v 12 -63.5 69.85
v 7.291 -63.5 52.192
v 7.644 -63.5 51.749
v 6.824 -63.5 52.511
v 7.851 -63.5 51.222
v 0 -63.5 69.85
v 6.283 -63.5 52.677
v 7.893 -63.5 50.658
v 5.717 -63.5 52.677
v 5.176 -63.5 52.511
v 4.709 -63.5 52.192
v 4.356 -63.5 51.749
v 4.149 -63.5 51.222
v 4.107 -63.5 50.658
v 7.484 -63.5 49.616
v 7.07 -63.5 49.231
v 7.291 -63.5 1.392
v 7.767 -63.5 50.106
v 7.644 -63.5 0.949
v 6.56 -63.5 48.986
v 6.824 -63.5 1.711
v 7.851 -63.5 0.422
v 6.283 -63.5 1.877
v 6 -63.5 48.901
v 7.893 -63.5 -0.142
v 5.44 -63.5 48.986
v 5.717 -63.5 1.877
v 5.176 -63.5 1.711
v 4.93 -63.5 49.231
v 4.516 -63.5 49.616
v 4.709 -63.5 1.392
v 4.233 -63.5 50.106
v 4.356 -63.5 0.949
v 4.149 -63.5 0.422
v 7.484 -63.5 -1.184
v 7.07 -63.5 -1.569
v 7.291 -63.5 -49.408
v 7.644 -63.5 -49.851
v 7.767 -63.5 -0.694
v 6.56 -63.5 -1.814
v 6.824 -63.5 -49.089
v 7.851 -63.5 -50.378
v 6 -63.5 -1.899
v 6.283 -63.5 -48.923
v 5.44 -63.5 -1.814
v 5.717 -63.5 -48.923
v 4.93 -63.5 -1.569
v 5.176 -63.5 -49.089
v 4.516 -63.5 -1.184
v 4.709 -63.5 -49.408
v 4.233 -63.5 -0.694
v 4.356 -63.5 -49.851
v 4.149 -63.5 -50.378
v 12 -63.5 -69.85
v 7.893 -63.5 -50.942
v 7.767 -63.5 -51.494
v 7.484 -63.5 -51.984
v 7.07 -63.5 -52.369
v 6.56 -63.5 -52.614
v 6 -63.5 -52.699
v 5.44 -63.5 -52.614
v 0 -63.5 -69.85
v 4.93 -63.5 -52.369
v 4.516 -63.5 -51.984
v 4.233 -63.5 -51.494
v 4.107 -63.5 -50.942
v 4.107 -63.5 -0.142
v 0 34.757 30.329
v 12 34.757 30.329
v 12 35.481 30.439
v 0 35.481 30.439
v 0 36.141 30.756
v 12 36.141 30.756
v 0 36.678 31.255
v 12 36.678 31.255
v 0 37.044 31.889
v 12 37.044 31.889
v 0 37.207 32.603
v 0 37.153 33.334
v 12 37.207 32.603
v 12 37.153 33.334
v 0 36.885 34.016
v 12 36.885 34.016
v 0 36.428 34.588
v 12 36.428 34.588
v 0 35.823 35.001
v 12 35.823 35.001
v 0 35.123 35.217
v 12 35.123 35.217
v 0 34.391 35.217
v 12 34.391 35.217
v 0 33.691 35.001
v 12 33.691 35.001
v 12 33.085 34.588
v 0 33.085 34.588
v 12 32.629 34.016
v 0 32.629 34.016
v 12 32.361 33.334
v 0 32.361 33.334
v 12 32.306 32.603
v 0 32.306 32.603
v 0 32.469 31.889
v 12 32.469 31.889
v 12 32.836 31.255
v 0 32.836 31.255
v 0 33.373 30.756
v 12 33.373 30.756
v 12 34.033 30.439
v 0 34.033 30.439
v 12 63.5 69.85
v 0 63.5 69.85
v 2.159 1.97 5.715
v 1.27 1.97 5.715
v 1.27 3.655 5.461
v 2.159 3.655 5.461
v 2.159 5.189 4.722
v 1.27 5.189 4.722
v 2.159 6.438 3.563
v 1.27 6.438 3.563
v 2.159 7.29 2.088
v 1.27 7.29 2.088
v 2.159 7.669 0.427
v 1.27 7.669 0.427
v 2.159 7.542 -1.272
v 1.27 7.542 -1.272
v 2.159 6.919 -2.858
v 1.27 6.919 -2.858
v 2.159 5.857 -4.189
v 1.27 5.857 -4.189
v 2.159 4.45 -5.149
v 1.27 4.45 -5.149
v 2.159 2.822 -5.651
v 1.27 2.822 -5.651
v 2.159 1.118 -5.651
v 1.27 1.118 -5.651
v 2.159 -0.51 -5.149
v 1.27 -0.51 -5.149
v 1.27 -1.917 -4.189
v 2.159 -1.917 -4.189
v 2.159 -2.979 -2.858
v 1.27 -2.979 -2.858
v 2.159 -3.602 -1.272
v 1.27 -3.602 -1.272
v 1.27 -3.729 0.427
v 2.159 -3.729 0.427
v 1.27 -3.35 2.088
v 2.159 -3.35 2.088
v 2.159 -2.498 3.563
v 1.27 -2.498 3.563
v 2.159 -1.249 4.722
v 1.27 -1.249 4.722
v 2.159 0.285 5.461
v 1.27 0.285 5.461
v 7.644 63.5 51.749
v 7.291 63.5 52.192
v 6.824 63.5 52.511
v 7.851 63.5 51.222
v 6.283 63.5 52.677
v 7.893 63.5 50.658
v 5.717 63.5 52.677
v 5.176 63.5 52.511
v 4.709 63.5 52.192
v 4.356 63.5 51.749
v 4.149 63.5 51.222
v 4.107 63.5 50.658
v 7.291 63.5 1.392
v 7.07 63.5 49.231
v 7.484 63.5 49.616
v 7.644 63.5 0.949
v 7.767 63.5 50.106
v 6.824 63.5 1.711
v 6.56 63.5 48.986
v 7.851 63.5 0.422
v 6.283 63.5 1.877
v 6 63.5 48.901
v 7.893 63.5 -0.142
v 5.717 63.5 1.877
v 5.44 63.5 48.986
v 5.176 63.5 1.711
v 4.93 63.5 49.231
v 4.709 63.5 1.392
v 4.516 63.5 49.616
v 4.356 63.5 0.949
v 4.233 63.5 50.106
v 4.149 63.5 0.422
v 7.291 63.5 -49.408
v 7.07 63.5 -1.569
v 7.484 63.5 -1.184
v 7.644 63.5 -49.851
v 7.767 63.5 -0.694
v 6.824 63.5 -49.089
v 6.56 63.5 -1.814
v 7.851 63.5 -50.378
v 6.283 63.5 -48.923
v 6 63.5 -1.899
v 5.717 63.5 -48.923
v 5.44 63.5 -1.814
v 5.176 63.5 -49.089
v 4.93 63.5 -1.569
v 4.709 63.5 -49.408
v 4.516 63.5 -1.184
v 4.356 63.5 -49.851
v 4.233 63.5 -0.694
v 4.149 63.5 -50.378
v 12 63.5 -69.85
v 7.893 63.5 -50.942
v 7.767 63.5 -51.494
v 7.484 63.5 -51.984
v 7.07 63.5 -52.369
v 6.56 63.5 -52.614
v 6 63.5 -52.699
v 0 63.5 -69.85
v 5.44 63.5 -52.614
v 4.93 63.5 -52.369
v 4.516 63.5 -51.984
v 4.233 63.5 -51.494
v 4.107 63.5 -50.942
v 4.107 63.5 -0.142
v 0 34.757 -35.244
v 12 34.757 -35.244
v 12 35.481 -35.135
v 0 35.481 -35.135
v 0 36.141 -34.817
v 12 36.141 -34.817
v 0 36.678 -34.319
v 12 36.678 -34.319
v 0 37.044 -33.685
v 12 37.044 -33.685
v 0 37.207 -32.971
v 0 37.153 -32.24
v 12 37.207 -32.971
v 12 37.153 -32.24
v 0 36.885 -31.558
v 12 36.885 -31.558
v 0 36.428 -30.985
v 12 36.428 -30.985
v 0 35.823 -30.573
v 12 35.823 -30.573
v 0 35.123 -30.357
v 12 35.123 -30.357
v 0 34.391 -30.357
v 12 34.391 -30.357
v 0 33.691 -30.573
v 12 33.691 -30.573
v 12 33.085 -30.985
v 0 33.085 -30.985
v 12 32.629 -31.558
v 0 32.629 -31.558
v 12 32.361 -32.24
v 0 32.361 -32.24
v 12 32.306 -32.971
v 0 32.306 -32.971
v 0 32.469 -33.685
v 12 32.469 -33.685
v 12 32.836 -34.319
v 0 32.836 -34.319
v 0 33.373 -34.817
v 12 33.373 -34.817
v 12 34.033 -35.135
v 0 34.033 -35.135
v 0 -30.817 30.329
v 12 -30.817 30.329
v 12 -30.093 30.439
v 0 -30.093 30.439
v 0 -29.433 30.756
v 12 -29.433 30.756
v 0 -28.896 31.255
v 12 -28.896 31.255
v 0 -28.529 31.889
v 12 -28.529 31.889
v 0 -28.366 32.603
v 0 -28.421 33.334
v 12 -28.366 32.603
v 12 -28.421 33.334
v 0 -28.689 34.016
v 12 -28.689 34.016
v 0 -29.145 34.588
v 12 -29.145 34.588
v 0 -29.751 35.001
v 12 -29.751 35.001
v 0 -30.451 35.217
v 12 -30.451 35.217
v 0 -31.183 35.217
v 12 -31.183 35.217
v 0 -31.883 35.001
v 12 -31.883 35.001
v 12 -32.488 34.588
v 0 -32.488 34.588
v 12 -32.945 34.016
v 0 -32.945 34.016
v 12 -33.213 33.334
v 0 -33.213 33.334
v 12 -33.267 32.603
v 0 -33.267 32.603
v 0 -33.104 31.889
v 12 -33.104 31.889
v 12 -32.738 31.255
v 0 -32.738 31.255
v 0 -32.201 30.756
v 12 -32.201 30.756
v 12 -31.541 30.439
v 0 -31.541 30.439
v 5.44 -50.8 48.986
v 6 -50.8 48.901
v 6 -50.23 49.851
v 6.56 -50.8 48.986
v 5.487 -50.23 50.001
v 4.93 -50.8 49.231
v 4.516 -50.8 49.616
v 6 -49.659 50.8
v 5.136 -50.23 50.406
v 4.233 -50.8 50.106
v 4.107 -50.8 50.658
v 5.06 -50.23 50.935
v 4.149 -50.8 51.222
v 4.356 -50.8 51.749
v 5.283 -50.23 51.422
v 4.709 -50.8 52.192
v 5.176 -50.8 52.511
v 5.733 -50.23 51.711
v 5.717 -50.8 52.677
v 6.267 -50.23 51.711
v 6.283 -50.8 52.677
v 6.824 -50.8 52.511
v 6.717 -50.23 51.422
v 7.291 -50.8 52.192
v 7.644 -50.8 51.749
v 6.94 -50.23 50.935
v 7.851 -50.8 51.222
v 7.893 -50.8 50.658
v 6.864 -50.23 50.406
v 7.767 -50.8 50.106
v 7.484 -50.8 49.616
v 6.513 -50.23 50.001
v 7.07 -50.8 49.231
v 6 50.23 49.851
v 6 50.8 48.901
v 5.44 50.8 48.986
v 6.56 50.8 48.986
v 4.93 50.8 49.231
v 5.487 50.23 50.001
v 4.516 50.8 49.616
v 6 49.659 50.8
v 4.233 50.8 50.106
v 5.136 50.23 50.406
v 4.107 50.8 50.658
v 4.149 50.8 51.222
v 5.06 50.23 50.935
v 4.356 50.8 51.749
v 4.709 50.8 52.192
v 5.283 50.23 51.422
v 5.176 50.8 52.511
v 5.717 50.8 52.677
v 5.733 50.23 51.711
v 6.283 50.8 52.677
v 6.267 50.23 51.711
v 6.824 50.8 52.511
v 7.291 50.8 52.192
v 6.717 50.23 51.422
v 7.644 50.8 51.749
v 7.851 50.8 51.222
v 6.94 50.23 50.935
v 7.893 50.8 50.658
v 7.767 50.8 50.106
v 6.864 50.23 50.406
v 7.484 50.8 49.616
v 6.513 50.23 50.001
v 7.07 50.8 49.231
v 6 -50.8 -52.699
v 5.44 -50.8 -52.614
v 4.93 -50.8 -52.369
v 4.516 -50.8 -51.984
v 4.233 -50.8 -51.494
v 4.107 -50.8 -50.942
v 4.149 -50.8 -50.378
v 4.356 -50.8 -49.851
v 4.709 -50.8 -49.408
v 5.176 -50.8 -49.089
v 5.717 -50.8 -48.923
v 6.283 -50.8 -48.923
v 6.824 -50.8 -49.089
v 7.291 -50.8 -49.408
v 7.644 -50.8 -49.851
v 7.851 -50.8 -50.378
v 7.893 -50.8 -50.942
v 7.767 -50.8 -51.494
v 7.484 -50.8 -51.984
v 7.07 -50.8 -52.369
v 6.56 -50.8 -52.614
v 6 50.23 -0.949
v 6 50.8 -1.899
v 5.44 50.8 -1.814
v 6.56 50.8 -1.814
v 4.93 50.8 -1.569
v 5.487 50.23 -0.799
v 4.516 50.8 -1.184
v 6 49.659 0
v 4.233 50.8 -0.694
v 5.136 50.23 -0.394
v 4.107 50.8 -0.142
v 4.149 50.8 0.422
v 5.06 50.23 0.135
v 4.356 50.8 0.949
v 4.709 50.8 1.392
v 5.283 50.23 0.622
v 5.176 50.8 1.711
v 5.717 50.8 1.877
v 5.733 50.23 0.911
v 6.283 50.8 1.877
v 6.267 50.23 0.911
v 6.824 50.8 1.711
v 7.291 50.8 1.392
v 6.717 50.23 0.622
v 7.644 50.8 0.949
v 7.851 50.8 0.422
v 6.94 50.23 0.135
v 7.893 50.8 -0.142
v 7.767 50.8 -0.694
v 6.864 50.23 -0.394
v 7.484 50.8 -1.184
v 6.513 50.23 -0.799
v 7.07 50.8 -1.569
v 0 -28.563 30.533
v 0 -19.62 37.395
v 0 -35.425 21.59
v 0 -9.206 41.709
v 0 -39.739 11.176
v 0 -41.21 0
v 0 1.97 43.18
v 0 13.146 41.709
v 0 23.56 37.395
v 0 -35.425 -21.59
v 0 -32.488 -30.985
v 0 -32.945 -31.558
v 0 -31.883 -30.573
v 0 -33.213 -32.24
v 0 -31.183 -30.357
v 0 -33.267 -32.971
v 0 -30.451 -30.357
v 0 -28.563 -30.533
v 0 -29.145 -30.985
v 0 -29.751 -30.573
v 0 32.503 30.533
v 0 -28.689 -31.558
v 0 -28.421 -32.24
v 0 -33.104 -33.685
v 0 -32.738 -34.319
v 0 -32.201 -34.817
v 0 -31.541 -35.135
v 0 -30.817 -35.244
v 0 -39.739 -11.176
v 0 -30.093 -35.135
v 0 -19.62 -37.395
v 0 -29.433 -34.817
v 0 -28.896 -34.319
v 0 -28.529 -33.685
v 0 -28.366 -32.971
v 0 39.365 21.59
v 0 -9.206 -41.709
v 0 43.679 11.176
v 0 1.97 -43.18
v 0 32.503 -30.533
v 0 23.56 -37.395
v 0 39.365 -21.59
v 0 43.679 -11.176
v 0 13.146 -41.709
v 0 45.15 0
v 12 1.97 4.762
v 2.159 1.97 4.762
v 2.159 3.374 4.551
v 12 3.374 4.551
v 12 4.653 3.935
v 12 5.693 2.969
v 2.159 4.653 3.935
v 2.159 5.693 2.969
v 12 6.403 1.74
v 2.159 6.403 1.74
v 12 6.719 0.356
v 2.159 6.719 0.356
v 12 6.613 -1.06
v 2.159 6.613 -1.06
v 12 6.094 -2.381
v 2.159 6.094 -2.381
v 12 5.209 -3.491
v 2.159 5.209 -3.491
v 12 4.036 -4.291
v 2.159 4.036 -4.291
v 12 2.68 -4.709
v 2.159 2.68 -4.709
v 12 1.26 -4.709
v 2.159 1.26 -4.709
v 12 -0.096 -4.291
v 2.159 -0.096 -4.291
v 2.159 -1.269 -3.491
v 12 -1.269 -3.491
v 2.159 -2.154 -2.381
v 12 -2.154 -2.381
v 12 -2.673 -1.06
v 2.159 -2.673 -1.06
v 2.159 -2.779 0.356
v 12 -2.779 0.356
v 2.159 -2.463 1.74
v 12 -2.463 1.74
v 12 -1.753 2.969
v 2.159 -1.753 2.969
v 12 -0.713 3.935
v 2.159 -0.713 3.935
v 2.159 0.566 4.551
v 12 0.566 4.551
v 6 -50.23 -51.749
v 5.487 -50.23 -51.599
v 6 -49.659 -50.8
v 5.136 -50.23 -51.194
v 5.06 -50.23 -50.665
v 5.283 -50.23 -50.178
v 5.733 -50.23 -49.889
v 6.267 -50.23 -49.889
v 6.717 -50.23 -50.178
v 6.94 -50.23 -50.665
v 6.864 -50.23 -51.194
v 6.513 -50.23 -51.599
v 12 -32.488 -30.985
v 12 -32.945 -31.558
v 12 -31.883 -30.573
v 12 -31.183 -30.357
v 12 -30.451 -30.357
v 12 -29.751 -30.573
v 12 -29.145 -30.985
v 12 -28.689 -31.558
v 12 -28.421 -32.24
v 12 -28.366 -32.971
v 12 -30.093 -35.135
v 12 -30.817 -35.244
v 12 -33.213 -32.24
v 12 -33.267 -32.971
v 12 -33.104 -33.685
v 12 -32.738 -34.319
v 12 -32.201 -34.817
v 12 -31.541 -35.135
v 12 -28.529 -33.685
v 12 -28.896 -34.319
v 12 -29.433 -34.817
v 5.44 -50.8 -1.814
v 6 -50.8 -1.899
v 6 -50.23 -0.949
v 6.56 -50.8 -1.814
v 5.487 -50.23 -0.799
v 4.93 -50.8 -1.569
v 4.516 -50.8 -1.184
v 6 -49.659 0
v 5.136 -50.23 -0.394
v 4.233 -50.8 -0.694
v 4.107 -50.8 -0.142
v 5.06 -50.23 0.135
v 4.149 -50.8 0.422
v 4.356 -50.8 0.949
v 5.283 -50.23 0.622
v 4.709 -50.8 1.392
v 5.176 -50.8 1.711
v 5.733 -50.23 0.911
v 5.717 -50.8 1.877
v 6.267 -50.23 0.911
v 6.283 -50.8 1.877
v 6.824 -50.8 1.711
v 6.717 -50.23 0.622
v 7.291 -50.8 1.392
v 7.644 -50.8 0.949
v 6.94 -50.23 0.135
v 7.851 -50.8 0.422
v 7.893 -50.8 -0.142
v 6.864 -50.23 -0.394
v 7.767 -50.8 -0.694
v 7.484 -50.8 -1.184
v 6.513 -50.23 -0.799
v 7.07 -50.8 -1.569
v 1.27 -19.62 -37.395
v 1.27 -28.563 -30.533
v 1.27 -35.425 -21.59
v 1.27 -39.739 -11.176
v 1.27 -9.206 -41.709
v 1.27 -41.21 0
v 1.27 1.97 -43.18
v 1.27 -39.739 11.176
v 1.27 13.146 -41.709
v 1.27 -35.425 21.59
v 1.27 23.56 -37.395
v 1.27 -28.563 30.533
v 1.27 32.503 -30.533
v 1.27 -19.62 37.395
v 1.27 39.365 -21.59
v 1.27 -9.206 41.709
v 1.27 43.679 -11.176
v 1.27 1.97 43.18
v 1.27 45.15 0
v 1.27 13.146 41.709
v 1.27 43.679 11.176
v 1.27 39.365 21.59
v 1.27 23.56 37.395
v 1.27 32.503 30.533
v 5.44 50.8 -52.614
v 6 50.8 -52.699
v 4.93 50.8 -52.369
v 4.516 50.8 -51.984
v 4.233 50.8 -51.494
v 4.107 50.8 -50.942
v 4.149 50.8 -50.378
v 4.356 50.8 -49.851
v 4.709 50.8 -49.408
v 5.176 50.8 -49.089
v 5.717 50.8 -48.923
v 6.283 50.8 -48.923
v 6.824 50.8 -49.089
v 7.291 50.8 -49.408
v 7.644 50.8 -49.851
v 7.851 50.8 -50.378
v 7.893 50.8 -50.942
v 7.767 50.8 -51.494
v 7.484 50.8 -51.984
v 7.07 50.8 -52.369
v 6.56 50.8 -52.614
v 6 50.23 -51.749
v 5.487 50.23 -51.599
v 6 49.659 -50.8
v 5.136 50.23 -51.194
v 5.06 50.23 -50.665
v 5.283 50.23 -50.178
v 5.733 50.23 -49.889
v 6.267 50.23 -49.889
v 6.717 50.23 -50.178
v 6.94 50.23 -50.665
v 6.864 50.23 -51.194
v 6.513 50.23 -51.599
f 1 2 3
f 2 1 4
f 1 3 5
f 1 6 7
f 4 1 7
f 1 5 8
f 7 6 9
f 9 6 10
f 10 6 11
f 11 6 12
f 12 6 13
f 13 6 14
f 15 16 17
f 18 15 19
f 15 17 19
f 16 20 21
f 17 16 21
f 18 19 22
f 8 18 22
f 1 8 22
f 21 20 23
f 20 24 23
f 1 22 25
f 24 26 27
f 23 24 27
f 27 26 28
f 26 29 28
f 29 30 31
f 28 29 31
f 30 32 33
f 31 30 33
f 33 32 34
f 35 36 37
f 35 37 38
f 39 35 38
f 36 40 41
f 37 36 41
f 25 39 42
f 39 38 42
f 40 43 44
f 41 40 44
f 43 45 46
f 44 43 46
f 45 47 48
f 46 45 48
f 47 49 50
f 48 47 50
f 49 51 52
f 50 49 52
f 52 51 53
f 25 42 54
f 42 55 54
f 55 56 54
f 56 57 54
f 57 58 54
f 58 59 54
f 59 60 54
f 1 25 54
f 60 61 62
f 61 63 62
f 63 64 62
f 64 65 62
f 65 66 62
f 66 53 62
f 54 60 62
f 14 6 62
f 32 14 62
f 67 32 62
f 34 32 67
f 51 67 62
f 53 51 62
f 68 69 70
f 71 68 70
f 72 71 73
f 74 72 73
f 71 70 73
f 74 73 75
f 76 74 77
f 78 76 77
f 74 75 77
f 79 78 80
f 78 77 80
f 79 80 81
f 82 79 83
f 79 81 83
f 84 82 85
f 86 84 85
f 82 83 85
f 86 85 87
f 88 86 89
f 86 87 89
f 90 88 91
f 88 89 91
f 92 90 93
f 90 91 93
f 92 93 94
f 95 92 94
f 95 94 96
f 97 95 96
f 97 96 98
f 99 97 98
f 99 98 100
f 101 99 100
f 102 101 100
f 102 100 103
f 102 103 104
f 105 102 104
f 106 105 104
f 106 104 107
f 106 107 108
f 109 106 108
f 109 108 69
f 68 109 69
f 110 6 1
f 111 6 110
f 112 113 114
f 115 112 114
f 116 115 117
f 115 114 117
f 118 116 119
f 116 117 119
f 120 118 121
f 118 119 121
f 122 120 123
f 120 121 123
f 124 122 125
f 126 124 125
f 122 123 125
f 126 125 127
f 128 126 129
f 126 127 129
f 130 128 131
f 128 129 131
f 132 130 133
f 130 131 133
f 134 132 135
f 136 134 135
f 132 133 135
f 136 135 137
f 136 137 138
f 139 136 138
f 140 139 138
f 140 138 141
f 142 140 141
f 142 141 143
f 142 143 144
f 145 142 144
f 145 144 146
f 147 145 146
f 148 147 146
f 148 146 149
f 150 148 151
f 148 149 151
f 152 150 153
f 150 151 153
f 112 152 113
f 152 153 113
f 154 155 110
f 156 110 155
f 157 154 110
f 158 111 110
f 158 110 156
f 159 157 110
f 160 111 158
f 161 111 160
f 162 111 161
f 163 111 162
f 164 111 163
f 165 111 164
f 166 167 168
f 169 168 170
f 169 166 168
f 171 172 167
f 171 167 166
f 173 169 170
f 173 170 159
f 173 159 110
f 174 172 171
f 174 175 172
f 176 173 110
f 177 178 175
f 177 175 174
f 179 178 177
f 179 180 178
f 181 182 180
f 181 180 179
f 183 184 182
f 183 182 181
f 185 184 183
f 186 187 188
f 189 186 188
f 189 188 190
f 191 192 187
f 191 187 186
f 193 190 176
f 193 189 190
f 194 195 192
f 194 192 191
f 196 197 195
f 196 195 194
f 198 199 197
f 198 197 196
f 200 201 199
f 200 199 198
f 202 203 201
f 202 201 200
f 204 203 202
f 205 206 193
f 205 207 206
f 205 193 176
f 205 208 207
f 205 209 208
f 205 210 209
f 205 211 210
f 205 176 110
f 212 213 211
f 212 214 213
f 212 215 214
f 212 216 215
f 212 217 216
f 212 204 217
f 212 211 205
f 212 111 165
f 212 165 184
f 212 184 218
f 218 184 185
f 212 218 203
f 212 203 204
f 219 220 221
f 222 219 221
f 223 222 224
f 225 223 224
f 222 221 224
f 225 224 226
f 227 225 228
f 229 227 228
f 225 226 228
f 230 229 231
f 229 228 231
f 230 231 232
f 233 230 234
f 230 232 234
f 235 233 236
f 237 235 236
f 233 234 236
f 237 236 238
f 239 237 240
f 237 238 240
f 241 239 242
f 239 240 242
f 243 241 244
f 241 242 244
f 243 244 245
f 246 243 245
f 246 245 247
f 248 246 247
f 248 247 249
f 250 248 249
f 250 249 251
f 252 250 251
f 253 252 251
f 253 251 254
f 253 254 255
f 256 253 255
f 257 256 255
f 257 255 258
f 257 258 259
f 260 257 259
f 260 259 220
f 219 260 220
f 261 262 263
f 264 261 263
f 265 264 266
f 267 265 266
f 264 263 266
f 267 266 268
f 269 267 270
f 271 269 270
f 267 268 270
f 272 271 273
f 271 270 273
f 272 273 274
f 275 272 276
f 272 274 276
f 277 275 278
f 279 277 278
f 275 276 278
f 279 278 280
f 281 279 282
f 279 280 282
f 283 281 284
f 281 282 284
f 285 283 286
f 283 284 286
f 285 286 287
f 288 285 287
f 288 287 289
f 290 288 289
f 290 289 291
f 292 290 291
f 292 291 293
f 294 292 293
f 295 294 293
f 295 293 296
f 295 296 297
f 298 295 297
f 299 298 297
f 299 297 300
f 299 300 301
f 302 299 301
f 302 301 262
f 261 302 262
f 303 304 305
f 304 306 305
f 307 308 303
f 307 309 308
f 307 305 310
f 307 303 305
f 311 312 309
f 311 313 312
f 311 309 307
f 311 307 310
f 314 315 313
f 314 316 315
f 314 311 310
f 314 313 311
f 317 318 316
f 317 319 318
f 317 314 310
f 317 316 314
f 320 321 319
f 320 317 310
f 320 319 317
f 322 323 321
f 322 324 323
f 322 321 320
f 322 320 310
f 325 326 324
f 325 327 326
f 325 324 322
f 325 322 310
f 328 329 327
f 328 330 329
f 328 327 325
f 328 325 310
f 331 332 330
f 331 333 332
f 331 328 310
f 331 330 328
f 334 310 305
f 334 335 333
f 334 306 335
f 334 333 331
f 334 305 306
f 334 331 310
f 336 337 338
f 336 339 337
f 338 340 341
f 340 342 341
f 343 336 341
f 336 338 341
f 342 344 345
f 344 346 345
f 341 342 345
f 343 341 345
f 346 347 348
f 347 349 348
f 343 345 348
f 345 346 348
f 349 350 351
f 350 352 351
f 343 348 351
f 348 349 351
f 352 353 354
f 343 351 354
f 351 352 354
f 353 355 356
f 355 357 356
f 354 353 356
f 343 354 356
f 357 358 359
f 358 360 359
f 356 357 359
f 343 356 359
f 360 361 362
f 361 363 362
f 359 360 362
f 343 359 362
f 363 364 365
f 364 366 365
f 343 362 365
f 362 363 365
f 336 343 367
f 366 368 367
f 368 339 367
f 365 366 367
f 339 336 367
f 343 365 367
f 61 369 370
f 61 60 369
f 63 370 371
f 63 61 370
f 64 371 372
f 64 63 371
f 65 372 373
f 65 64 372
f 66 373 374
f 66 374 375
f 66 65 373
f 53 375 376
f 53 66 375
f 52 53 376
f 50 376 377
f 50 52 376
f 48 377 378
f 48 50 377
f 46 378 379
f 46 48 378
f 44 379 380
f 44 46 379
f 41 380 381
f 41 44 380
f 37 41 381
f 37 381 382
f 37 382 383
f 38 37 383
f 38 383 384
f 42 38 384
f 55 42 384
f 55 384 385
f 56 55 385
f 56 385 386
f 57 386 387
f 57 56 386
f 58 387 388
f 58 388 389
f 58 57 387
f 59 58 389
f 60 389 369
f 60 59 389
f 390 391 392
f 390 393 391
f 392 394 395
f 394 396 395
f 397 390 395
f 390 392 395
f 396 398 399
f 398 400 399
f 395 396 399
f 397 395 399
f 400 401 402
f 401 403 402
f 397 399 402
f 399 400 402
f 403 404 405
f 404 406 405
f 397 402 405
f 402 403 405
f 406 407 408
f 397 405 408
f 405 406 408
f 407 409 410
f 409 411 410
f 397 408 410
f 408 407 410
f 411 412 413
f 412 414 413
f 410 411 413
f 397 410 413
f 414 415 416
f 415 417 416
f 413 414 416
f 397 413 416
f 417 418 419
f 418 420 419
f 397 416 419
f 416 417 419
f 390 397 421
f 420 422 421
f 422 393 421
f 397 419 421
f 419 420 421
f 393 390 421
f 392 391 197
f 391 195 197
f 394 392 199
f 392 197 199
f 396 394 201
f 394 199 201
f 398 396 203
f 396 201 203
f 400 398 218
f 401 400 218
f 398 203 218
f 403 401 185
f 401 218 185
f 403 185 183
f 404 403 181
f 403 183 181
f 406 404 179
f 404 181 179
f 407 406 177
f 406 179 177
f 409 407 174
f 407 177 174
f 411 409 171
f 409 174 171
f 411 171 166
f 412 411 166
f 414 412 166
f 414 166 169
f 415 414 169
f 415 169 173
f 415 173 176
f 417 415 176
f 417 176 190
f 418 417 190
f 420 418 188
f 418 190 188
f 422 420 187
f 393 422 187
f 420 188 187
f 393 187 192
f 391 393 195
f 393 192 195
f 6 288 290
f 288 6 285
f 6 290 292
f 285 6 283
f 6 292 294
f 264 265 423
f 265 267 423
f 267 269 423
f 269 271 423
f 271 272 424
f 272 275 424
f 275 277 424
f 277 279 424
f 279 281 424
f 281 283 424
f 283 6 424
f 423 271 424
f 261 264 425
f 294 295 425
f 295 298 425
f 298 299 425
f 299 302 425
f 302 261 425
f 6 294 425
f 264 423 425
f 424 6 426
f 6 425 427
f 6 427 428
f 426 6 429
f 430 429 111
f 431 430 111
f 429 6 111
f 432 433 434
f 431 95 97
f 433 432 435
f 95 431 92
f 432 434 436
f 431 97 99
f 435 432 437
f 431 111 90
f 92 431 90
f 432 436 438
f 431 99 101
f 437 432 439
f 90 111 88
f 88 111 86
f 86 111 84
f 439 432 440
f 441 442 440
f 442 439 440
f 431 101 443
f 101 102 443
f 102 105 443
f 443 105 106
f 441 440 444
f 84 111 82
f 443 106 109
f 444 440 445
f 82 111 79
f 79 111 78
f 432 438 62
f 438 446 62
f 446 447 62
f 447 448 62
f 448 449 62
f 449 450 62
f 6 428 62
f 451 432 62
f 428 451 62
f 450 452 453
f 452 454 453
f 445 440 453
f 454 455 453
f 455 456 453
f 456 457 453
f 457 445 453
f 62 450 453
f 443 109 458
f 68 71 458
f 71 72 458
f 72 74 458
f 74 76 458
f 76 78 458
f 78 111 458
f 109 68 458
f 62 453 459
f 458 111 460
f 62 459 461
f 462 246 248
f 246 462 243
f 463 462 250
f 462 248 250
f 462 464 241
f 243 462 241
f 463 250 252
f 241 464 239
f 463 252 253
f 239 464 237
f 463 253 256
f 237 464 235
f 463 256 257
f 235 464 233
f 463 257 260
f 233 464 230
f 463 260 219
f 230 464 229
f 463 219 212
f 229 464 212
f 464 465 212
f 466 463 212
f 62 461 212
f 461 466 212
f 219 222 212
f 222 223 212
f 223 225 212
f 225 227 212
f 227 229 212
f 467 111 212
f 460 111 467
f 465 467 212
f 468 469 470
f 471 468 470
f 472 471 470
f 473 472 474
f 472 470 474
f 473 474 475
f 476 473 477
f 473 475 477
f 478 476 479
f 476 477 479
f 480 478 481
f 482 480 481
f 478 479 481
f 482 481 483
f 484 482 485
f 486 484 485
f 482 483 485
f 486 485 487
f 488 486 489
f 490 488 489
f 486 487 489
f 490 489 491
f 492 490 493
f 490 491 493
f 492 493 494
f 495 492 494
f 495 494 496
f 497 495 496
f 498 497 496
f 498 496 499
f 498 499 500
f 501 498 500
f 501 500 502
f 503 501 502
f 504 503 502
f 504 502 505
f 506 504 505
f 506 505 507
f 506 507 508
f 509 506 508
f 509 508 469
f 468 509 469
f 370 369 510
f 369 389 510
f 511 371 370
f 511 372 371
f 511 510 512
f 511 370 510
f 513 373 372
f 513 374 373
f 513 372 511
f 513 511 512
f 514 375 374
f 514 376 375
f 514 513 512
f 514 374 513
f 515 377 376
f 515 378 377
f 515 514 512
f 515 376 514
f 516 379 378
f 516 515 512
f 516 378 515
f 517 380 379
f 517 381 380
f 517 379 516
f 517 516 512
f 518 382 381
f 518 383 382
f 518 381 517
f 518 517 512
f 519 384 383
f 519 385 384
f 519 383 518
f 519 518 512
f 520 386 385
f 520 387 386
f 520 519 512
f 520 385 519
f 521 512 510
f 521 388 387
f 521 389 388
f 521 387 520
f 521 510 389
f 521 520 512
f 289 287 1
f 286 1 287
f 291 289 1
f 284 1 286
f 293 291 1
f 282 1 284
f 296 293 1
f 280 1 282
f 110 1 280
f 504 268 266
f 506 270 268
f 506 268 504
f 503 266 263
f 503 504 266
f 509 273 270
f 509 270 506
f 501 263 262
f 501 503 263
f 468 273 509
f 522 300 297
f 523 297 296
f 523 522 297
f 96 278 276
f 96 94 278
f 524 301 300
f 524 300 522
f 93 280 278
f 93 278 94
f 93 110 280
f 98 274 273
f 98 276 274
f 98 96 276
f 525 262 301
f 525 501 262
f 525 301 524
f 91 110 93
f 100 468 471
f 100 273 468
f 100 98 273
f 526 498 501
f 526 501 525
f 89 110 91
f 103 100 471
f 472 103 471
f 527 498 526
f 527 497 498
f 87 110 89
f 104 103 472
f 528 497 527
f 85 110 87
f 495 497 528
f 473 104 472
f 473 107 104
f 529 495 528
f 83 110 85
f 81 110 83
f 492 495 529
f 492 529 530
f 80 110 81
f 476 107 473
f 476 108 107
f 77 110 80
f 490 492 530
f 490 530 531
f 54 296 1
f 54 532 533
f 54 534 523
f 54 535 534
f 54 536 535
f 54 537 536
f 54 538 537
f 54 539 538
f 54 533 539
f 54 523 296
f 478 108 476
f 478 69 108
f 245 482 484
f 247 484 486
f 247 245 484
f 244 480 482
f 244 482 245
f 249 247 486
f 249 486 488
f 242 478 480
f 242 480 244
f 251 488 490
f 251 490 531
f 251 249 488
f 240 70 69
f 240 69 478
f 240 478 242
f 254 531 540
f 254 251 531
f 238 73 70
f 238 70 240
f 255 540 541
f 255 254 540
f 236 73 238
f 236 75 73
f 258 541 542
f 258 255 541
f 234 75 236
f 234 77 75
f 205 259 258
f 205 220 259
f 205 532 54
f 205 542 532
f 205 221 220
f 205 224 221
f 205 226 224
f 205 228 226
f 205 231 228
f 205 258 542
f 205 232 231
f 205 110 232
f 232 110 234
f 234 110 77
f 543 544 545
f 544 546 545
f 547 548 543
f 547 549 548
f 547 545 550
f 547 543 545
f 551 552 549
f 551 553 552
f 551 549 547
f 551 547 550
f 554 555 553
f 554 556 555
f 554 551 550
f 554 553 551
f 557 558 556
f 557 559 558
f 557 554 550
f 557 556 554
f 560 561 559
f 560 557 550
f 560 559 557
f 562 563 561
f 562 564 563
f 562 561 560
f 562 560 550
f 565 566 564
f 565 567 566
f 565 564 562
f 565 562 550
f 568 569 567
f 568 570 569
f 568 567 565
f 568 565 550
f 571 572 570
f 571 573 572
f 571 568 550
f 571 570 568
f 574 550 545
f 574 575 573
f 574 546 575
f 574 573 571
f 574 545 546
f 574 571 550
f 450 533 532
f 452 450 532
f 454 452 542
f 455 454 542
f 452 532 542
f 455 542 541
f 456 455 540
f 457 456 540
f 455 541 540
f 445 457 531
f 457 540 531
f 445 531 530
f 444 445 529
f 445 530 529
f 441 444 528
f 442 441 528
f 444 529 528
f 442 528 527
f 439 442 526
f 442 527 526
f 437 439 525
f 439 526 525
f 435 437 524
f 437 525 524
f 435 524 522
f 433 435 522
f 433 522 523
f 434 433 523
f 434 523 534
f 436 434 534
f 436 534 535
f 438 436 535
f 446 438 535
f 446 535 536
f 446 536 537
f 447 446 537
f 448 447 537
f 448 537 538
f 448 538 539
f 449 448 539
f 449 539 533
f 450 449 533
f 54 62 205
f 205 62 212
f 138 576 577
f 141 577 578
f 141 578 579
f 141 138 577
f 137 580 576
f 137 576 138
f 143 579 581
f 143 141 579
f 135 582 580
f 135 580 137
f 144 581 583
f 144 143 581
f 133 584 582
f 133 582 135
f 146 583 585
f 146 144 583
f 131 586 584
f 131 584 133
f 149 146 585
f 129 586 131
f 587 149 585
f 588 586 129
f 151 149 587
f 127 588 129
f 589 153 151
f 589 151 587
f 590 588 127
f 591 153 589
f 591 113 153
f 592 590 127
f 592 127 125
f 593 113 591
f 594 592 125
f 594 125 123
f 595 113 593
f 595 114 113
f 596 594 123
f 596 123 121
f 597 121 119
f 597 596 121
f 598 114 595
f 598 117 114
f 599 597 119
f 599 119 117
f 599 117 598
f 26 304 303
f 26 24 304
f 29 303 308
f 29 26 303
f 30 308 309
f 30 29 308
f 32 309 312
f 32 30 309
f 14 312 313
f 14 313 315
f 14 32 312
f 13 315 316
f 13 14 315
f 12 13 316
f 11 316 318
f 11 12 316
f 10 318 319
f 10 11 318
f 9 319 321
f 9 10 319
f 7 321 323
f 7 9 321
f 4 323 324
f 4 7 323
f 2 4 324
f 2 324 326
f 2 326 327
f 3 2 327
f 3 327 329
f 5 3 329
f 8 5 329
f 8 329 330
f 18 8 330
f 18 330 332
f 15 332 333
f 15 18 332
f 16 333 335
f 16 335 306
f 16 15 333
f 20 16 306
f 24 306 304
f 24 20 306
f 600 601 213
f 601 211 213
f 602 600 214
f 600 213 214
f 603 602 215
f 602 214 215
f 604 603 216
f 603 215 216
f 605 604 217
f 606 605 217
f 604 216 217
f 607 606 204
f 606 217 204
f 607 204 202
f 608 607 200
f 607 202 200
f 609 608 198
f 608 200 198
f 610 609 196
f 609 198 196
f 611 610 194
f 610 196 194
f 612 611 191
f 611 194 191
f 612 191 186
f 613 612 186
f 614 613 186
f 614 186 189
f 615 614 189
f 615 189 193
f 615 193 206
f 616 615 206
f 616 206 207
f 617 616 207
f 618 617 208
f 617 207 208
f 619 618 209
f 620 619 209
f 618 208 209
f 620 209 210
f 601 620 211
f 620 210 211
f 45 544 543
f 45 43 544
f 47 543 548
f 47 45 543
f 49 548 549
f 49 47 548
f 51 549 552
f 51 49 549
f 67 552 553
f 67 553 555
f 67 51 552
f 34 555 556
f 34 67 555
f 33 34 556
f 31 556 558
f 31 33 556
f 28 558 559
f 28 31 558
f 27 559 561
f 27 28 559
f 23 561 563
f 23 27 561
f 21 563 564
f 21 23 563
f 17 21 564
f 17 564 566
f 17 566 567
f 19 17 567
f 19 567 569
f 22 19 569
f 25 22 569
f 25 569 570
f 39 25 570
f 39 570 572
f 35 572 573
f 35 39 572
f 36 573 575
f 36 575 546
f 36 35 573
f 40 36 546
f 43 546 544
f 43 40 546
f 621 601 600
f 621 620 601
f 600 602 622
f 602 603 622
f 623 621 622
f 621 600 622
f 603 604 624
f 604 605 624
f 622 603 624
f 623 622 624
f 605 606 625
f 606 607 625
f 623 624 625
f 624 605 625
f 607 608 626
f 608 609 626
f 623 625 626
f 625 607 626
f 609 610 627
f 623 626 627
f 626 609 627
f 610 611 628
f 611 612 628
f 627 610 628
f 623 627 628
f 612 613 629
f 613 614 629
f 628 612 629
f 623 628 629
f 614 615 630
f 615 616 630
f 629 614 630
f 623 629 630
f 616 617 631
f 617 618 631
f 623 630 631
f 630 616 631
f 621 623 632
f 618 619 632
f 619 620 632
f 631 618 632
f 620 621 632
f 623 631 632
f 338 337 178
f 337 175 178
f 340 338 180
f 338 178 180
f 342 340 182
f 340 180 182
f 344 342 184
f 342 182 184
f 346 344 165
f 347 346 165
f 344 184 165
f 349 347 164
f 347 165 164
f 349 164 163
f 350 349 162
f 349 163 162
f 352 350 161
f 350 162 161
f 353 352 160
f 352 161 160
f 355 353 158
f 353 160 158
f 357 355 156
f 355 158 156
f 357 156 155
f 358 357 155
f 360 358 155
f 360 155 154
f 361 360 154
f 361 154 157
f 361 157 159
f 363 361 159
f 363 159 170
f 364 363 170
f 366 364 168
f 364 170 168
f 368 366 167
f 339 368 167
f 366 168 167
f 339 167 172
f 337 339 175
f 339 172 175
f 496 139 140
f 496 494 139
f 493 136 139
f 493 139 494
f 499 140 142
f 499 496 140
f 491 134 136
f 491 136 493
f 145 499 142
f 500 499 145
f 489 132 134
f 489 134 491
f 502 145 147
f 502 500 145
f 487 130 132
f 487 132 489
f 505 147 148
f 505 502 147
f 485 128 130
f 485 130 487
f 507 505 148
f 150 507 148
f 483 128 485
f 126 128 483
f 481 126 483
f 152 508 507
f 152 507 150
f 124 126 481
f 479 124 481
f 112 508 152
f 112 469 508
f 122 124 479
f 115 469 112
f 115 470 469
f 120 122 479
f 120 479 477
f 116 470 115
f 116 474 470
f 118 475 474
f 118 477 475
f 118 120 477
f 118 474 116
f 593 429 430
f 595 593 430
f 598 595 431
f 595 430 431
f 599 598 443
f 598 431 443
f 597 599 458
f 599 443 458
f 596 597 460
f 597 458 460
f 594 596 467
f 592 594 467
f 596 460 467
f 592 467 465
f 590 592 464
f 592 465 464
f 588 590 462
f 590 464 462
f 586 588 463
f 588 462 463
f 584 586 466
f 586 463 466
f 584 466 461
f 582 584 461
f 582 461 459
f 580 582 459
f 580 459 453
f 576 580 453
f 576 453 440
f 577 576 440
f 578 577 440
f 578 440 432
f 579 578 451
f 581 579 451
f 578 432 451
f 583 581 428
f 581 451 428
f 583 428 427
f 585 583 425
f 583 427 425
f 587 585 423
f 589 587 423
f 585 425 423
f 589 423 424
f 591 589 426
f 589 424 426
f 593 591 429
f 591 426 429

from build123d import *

# Parameters (mm, degrees)
SKETCH1_W                           = 139.7
SKETCH1_H                           = 127
BOSS_EXTRUDE1_DEPTH                 = 12
F_8_CLEARANCE_HOLE1_D               = 4.9149
SKETCH2_R                           = 43.18
SKETCH2_R_2                         = 4.7625
CUT_EXTRUDE1_DEPTH                  = 1.27
SKETCH2_4_R                         = 4.7625
CUT_EXTRUDE2_DEPTH                  = 96.159195562
TAP_DRILL_FOR_10_24_TAP1_AT_2_COUNT = 2
TAP_DRILL_FOR_10_24_TAP1_AT_2_PITCH = 50.8
TAP_DRILL_FOR_10_24_TAP1_AT_3_COUNT = 2
TAP_DRILL_FOR_10_24_TAP1_AT_3_PITCH = 101.6
SKETCH8_R                           = 5.715
CUT_EXTRUDE3_DEPTH                  = 0.889


with BuildPart() as part:
    # Sketch1 → Boss-Extrude1 (new body)
    with BuildSketch(Plane(origin=(0, 0, 0), x_dir=(0, 0, -1), z_dir=(1, 0, 0))):
        Rectangle(SKETCH1_W, SKETCH1_H)
    extrude(amount=BOSS_EXTRUDE1_DEPTH)

    # #8 Clearance Hole1 (through all)
    with Locations(Plane.ZY):
        with Locations((-32.786915098, 34.756915098), (32.786915098, 34.756915098), (32.786915098, -30.816915098), (-32.786915098, -30.816915098)):
            Hole(F_8_CLEARANCE_HOLE1_D / 2)

    # Sketch2 → Cut-Extrude1 (cut)
    with BuildSketch(Plane.ZY):
        with Locations((0, 1.97)):
            Circle(SKETCH2_R)
        with Locations((0, 1.97)):
            Circle(SKETCH2_R_2, mode=Mode.SUBTRACT)
    extrude(amount=-CUT_EXTRUDE1_DEPTH, mode=Mode.SUBTRACT)

    # Sketch2<4> → Cut-Extrude2 (cut, through all)
    with BuildSketch(Plane.ZY):
        with Locations((0, 1.97)):
            Circle(SKETCH2_4_R)
    extrude(amount=-CUT_EXTRUDE2_DEPTH, mode=Mode.SUBTRACT)

    # Sketch7 → Tap Drill for #10-24 Tap1 (revolve, cut)
    with BuildSketch(Plane(origin=(6, -63.5, -50.8), x_dir=(0, 0, -1), z_dir=(1, 0, 0))):
        Polygon((0, 0), (0, 13.840824014), (1.89865, 12.7), (1.89865, 0), align=None)
    tap_drill_for_10_24_tap1 = revolve(axis=Axis((6, -69.85, -50.8), (0, 1, 0)), mode=Mode.SUBTRACT)

    # Tap Drill for #10-24 Tap1 at 2: Tap Drill for #10-24 Tap1 ×2
    with Locations(*[(0, 0, i * TAP_DRILL_FOR_10_24_TAP1_AT_2_PITCH) for i in range(1, TAP_DRILL_FOR_10_24_TAP1_AT_2_COUNT)]):
        add(tap_drill_for_10_24_tap1, mode=Mode.SUBTRACT)

    # Tap Drill for #10-24 Tap1 at 3: Tap Drill for #10-24 Tap1 ×2
    with Locations(*[(0, 0, i * TAP_DRILL_FOR_10_24_TAP1_AT_3_PITCH) for i in range(1, TAP_DRILL_FOR_10_24_TAP1_AT_3_COUNT)]):
        add(tap_drill_for_10_24_tap1, mode=Mode.SUBTRACT)

    # Mirror1: Tap Drill for #10-24 Tap1 across plane
    add(tap_drill_for_10_24_tap1.mirror(Plane.ZX), mode=Mode.SUBTRACT)

    # Mirror1 copy 1 sketch → Mirror1 copy 1 (revolve, cut)
    with BuildSketch(Plane(origin=(6, 63.5, 0), x_dir=(0, 0, -1), z_dir=(1, 0, 0))):
        Polygon((0, 0), (0, -13.840824014), (1.89865, -12.7), (1.89865, 0), align=None)
    revolve(axis=Axis((6, 69.85, 0), (0, 1, 0)), mode=Mode.SUBTRACT)

    # Mirror1 copy 2 sketch → Mirror1 copy 2 (revolve, cut)
    with BuildSketch(Plane(origin=(6, 63.5, 50.8), x_dir=(0, 0, -1), z_dir=(1, 0, 0))):
        Polygon((0, 0), (0, -13.840824014), (1.89865, -12.7), (1.89865, 0), align=None)
    revolve(axis=Axis((6, 69.85, 50.8), (0, 1, 0)), mode=Mode.SUBTRACT)

    # Sketch8 → Cut-Extrude3 (cut)
    with BuildSketch(Plane.ZY.offset(-1.27)):
        with Locations((0, 1.97)):
            Circle(SKETCH8_R)
    extrude(amount=-CUT_EXTRUDE3_DEPTH, mode=Mode.SUBTRACT)


solid = part.part
